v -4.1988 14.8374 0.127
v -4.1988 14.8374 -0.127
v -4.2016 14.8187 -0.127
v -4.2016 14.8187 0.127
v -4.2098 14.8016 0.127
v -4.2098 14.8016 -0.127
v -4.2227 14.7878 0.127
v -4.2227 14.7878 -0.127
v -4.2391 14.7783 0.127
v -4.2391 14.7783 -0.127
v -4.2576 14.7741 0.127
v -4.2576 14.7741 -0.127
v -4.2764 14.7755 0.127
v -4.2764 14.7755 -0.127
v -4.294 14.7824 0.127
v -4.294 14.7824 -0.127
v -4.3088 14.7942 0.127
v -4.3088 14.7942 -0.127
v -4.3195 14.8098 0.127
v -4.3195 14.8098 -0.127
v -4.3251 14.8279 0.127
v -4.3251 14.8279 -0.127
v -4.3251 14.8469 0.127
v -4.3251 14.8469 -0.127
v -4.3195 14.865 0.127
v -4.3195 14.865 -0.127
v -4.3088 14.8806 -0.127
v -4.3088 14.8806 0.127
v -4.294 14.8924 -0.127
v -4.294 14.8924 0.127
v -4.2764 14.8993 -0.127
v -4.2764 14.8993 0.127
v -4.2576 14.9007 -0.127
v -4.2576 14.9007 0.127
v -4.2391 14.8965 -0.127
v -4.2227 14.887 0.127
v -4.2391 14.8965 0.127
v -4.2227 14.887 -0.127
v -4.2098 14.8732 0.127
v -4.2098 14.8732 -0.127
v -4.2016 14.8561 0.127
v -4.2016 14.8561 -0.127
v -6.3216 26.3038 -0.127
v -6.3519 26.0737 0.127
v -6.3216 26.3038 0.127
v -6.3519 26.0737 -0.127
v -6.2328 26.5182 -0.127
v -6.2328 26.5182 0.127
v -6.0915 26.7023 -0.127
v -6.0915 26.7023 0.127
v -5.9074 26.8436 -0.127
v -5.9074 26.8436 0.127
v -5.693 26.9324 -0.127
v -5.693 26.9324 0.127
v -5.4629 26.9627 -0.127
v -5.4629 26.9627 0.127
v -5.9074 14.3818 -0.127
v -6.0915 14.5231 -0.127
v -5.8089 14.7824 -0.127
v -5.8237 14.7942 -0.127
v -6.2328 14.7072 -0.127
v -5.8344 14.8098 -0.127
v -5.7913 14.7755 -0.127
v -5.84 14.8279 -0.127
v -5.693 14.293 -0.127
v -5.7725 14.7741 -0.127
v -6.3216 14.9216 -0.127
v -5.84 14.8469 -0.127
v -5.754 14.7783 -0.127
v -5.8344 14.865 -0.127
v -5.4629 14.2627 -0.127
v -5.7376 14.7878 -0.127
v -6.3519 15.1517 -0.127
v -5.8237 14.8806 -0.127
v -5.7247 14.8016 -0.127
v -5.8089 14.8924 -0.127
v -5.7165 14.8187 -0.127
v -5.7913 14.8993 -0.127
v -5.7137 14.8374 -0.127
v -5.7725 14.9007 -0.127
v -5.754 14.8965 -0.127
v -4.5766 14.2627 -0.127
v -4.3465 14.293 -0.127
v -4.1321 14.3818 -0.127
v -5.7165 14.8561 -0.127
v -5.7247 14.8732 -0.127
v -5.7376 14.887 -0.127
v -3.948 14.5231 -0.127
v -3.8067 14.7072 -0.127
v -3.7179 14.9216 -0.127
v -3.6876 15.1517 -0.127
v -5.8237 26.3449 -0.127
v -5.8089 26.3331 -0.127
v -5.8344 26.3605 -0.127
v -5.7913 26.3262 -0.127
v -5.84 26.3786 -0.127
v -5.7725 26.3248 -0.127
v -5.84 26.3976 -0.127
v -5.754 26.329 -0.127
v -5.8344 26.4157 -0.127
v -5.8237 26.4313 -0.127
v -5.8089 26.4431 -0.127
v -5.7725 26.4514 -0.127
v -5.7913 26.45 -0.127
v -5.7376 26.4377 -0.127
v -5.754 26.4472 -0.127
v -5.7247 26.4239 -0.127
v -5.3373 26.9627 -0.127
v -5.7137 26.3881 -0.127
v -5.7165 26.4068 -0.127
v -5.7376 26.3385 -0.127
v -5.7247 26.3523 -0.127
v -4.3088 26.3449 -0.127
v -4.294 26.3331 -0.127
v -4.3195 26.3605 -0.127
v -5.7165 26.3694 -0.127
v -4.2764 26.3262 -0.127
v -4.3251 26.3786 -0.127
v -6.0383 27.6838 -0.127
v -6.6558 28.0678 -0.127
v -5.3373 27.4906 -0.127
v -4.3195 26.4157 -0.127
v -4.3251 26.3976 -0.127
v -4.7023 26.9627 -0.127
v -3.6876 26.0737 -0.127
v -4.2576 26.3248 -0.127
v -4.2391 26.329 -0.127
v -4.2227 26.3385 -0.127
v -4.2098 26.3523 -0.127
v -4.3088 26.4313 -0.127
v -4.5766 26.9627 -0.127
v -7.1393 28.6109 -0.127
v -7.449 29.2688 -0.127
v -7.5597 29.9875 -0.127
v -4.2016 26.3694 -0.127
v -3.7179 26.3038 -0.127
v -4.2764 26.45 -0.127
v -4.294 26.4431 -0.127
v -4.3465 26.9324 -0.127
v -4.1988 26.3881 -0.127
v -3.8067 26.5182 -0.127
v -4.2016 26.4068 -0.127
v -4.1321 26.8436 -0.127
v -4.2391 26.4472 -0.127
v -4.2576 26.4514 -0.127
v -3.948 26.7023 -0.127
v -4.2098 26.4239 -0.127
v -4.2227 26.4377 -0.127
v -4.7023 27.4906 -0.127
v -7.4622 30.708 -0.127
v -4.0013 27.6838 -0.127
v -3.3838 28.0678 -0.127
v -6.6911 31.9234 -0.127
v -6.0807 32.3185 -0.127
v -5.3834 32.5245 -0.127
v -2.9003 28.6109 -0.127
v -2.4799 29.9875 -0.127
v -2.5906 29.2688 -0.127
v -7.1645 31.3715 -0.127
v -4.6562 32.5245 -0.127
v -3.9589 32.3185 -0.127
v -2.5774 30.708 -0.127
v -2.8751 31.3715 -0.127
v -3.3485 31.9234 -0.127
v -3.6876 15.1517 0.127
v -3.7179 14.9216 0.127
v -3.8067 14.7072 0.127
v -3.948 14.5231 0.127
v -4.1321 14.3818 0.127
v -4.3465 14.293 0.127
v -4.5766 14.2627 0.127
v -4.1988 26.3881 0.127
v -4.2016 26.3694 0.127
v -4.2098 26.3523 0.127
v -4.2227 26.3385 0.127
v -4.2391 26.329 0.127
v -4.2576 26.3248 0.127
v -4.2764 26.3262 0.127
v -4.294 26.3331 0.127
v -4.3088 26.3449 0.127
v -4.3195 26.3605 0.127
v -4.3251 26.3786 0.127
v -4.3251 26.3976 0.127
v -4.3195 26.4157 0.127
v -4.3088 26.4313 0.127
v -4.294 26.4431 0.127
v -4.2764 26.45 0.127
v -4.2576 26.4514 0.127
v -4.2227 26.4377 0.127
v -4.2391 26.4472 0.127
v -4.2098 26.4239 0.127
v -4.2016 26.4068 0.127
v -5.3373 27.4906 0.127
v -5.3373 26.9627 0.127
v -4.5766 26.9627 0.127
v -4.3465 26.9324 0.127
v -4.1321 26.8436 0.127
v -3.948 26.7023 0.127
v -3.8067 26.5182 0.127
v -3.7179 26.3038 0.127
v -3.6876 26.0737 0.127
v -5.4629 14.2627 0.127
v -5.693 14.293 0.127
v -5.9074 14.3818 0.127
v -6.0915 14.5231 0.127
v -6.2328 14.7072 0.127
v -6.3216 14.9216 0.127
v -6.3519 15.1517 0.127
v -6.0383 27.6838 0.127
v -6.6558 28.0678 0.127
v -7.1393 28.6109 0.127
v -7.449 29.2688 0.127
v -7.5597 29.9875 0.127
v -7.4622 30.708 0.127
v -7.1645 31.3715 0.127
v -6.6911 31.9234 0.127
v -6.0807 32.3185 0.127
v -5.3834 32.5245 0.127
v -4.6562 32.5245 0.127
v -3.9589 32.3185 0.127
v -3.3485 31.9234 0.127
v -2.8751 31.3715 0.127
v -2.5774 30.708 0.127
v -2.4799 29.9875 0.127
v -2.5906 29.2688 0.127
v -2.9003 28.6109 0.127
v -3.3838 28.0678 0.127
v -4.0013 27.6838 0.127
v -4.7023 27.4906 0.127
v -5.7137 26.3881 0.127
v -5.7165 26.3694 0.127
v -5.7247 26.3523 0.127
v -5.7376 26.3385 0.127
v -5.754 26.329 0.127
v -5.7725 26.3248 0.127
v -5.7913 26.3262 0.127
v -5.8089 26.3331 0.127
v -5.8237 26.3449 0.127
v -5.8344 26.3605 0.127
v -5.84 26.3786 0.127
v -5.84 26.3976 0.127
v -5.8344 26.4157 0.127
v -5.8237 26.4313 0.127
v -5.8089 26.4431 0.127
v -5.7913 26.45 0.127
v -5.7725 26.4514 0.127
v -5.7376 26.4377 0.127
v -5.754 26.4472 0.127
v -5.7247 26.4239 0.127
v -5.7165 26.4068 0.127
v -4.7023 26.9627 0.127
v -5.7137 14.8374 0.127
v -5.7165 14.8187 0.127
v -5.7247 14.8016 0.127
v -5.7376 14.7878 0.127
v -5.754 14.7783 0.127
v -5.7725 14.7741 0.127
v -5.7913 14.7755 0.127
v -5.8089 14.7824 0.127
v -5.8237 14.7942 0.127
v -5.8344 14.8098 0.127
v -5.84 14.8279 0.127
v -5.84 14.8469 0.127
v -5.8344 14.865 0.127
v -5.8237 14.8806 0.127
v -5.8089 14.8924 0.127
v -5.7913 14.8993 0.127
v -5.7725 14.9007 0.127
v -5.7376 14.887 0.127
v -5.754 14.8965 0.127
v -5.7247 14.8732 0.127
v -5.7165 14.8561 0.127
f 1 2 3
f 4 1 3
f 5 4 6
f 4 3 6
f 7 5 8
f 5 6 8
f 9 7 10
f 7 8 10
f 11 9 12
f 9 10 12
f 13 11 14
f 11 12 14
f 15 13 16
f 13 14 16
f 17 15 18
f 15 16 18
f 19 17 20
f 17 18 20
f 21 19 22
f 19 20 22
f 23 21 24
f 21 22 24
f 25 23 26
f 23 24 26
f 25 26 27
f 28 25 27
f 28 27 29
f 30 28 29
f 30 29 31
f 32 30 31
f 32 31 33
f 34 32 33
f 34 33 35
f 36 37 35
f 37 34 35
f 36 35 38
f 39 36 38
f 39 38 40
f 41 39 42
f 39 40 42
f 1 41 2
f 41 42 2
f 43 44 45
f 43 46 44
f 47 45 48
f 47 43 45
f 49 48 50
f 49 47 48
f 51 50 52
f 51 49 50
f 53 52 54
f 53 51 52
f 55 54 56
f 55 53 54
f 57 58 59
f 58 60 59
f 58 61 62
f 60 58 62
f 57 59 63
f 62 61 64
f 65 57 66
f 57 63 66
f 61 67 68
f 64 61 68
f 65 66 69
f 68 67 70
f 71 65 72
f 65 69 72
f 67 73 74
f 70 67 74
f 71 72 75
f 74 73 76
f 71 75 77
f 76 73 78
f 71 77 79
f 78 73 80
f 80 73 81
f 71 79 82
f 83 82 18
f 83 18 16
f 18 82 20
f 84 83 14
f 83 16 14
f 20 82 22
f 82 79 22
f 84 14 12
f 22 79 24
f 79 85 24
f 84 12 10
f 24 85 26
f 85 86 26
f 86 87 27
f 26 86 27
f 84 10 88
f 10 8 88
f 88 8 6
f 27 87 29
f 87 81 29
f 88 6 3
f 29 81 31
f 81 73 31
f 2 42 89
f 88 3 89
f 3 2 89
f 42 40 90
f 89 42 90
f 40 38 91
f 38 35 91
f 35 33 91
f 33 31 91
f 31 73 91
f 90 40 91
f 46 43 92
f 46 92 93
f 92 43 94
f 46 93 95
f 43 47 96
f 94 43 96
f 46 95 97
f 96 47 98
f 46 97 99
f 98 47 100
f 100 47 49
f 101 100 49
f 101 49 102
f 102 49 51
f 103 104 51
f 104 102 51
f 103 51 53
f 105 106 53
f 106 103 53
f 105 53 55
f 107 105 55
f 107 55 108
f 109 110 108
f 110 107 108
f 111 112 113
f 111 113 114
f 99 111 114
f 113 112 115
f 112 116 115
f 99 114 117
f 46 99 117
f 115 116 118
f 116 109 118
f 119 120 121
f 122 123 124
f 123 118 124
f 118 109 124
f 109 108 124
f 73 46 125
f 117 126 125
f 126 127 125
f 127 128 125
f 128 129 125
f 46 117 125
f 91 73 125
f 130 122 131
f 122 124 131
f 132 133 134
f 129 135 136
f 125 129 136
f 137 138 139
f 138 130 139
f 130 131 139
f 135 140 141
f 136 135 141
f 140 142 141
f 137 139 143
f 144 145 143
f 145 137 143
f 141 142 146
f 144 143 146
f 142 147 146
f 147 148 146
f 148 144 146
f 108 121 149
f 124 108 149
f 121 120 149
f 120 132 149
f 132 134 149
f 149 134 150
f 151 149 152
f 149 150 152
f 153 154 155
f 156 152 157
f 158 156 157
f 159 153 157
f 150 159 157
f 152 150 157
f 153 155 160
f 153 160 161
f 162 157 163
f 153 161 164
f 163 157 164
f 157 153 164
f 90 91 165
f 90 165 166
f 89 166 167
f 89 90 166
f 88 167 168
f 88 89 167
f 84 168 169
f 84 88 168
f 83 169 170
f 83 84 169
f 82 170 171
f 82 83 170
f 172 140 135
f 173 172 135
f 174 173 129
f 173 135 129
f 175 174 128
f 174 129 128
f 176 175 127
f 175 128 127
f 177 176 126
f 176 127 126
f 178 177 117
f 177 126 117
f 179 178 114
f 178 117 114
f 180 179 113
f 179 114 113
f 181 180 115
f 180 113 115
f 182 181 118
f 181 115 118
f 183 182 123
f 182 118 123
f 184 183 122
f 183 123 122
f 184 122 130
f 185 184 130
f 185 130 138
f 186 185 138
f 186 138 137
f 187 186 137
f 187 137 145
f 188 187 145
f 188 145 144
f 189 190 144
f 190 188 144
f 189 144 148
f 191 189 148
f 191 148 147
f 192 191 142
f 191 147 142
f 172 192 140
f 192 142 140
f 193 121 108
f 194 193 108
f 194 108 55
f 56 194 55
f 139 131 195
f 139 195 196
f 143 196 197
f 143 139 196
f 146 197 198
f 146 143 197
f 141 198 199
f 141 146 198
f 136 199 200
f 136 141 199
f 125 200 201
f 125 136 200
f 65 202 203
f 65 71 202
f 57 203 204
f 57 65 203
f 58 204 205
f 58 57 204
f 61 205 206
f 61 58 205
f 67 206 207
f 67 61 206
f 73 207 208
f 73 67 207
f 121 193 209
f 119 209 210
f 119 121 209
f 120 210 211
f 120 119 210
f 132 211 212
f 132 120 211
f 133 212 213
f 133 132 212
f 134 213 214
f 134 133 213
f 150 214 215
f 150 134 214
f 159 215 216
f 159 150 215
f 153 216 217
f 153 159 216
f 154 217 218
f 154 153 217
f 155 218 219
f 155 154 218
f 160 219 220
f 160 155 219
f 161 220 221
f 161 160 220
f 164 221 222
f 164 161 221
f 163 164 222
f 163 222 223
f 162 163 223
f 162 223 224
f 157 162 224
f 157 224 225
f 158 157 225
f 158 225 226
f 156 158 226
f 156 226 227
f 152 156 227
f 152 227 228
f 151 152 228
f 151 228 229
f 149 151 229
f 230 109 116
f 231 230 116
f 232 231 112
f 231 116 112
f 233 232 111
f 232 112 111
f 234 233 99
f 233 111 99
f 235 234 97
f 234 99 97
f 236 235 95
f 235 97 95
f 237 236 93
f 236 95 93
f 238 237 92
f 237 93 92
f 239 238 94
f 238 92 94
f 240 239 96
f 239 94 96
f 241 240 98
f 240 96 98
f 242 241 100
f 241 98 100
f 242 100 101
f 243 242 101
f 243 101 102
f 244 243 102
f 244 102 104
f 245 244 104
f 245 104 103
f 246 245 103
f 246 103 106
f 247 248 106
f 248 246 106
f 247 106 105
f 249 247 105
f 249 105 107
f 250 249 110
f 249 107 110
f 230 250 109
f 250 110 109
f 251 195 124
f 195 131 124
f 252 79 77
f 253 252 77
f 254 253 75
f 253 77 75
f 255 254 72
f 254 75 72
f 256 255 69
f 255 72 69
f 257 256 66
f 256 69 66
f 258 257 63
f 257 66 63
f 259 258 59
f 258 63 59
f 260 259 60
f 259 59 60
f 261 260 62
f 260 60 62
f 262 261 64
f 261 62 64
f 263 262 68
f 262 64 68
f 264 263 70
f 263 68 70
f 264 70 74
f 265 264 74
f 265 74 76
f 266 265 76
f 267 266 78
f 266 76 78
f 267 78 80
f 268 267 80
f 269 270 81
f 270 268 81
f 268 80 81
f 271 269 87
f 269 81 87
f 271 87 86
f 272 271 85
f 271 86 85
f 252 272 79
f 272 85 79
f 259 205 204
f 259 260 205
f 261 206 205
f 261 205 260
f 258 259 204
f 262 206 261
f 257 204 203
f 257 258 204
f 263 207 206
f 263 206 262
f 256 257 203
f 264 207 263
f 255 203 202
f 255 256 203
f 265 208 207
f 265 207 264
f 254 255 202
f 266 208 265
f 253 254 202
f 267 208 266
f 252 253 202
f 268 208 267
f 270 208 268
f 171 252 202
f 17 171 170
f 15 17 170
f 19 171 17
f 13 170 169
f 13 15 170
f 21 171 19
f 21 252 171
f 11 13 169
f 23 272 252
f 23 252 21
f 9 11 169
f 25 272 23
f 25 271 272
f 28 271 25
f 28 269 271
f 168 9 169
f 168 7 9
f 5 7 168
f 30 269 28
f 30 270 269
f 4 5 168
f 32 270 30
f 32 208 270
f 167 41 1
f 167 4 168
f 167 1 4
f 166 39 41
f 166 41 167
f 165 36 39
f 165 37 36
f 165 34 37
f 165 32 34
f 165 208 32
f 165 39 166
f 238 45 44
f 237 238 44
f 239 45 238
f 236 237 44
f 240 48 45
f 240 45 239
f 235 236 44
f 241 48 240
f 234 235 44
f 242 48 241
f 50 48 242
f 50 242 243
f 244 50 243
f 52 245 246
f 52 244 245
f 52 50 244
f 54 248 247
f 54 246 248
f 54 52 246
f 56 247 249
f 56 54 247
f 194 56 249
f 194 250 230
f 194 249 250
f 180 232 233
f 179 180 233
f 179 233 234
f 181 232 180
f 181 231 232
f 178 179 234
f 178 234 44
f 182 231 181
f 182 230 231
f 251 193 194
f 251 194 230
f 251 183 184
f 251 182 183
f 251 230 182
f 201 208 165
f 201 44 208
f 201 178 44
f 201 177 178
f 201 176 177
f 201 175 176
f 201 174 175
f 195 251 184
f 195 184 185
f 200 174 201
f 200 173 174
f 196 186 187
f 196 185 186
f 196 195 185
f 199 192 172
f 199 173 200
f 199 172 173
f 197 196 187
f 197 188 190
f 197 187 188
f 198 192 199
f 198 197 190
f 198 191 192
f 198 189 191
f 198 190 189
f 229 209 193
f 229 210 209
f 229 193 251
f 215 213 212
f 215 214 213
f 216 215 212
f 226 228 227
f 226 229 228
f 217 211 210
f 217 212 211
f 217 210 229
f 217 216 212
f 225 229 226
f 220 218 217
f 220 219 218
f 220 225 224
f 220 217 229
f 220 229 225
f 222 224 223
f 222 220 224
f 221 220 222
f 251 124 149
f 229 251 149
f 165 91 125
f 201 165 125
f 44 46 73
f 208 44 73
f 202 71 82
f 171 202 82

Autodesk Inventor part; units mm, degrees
ref_plane "YZ Plane" through (0, 0, 0) normal (1, 0, 0) x (0, 1, 0)
ref_plane "XZ Plane" through (0, 0, 0) normal (0, 1, 0) x (-1, 0, 0)
ref_plane "XY Plane" through (0, 0, 0) normal (0, 0, 1) x (1, 0, 0)
sketch "Sketch2" plane through (0, 0, 0) normal (0, 0, 1) x (1, 0, 0)
  line L0 (-4.7023, 28.2327) -> (-5.3373, 28.2327)
  line L1 (-5.3373, 28.2327) -> (-5.3373, 26.3277)
  line L2 (-4.7023, 26.3277) -> (-4.7023, 28.2327)
  line L3 (-5.3373, 26.3277) -> (-4.7023, 26.3277)
  arc A0 (-5.4629, 26.9627) -> (-6.3519, 26.0737) centre (-5.4629, 26.0737) ccw
  line L4 (-4.5766, 26.9627) -> (-5.4629, 26.9627)
  arc A1 (-3.6876, 26.0737) -> (-4.5766, 26.9627) centre (-4.5766, 26.0737) ccw
  line L5 (-3.6876, 15.1517) -> (-3.6876, 26.0737)
  arc A2 (-4.5766, 14.2627) -> (-3.6876, 15.1517) centre (-4.5766, 15.1517) ccw
  line L6 (-5.4629, 14.2627) -> (-4.5766, 14.2627)
  arc A3 (-6.3519, 15.1517) -> (-5.4629, 14.2627) centre (-5.4629, 15.1517) ccw
  line L7 (-6.3519, 26.0737) -> (-6.3519, 15.1517)
  line L8 (-6.3519, 14.2627) -> (-3.6876, 26.9627) construction
  line L9 (-3.6876, 14.2627) -> (-6.3519, 26.9627) construction
  line L10 (-5.3373, 26.3277) -> (-4.7023, 28.2327) construction
  line L11 (-4.7023, 26.3277) -> (-5.3373, 28.2327) construction
  circle A4 centre (-5.0198, 30.0107) radius 2.54
  circle A5 centre (-5.7772, 26.3881) radius 0.0635
  line L12 (-5.4629, 26.0737) -> (-6.0915, 26.7024) construction
  line L13 (-5.0198, 20.6127) -> (-3.948, 20.6127)
  line L14 (-3.948, 20.6127) -> (-5.0198, 20.6127)
  line L15 (-5.0198, 20.6127) -> (-5.0198, 22.4129)
  circle A6 centre (-4.2623, 26.3881) radius 0.0635
  circle A7 centre (-5.7772, 14.8374) radius 0.0635
  circle A8 centre (-4.2623, 14.8374) radius 0.0635
  point P0 (0, 0)
  point P1 (-5.3373, 26.9627)
  point P2 (-4.7023, 26.9627)
  point P3 (-4.7023, 27.4907)
  point P4 (-5.3373, 27.4907)
  dimension "d7" = 5.08
  dimension "d8" = 3.048
  dimension "d9" = 0.127
  dimension "d10" = 0.4445
extrude "Extrusion1" add sketch "Sketch2" along normal mid plane 0.254
properties material "ABS Plastic"
